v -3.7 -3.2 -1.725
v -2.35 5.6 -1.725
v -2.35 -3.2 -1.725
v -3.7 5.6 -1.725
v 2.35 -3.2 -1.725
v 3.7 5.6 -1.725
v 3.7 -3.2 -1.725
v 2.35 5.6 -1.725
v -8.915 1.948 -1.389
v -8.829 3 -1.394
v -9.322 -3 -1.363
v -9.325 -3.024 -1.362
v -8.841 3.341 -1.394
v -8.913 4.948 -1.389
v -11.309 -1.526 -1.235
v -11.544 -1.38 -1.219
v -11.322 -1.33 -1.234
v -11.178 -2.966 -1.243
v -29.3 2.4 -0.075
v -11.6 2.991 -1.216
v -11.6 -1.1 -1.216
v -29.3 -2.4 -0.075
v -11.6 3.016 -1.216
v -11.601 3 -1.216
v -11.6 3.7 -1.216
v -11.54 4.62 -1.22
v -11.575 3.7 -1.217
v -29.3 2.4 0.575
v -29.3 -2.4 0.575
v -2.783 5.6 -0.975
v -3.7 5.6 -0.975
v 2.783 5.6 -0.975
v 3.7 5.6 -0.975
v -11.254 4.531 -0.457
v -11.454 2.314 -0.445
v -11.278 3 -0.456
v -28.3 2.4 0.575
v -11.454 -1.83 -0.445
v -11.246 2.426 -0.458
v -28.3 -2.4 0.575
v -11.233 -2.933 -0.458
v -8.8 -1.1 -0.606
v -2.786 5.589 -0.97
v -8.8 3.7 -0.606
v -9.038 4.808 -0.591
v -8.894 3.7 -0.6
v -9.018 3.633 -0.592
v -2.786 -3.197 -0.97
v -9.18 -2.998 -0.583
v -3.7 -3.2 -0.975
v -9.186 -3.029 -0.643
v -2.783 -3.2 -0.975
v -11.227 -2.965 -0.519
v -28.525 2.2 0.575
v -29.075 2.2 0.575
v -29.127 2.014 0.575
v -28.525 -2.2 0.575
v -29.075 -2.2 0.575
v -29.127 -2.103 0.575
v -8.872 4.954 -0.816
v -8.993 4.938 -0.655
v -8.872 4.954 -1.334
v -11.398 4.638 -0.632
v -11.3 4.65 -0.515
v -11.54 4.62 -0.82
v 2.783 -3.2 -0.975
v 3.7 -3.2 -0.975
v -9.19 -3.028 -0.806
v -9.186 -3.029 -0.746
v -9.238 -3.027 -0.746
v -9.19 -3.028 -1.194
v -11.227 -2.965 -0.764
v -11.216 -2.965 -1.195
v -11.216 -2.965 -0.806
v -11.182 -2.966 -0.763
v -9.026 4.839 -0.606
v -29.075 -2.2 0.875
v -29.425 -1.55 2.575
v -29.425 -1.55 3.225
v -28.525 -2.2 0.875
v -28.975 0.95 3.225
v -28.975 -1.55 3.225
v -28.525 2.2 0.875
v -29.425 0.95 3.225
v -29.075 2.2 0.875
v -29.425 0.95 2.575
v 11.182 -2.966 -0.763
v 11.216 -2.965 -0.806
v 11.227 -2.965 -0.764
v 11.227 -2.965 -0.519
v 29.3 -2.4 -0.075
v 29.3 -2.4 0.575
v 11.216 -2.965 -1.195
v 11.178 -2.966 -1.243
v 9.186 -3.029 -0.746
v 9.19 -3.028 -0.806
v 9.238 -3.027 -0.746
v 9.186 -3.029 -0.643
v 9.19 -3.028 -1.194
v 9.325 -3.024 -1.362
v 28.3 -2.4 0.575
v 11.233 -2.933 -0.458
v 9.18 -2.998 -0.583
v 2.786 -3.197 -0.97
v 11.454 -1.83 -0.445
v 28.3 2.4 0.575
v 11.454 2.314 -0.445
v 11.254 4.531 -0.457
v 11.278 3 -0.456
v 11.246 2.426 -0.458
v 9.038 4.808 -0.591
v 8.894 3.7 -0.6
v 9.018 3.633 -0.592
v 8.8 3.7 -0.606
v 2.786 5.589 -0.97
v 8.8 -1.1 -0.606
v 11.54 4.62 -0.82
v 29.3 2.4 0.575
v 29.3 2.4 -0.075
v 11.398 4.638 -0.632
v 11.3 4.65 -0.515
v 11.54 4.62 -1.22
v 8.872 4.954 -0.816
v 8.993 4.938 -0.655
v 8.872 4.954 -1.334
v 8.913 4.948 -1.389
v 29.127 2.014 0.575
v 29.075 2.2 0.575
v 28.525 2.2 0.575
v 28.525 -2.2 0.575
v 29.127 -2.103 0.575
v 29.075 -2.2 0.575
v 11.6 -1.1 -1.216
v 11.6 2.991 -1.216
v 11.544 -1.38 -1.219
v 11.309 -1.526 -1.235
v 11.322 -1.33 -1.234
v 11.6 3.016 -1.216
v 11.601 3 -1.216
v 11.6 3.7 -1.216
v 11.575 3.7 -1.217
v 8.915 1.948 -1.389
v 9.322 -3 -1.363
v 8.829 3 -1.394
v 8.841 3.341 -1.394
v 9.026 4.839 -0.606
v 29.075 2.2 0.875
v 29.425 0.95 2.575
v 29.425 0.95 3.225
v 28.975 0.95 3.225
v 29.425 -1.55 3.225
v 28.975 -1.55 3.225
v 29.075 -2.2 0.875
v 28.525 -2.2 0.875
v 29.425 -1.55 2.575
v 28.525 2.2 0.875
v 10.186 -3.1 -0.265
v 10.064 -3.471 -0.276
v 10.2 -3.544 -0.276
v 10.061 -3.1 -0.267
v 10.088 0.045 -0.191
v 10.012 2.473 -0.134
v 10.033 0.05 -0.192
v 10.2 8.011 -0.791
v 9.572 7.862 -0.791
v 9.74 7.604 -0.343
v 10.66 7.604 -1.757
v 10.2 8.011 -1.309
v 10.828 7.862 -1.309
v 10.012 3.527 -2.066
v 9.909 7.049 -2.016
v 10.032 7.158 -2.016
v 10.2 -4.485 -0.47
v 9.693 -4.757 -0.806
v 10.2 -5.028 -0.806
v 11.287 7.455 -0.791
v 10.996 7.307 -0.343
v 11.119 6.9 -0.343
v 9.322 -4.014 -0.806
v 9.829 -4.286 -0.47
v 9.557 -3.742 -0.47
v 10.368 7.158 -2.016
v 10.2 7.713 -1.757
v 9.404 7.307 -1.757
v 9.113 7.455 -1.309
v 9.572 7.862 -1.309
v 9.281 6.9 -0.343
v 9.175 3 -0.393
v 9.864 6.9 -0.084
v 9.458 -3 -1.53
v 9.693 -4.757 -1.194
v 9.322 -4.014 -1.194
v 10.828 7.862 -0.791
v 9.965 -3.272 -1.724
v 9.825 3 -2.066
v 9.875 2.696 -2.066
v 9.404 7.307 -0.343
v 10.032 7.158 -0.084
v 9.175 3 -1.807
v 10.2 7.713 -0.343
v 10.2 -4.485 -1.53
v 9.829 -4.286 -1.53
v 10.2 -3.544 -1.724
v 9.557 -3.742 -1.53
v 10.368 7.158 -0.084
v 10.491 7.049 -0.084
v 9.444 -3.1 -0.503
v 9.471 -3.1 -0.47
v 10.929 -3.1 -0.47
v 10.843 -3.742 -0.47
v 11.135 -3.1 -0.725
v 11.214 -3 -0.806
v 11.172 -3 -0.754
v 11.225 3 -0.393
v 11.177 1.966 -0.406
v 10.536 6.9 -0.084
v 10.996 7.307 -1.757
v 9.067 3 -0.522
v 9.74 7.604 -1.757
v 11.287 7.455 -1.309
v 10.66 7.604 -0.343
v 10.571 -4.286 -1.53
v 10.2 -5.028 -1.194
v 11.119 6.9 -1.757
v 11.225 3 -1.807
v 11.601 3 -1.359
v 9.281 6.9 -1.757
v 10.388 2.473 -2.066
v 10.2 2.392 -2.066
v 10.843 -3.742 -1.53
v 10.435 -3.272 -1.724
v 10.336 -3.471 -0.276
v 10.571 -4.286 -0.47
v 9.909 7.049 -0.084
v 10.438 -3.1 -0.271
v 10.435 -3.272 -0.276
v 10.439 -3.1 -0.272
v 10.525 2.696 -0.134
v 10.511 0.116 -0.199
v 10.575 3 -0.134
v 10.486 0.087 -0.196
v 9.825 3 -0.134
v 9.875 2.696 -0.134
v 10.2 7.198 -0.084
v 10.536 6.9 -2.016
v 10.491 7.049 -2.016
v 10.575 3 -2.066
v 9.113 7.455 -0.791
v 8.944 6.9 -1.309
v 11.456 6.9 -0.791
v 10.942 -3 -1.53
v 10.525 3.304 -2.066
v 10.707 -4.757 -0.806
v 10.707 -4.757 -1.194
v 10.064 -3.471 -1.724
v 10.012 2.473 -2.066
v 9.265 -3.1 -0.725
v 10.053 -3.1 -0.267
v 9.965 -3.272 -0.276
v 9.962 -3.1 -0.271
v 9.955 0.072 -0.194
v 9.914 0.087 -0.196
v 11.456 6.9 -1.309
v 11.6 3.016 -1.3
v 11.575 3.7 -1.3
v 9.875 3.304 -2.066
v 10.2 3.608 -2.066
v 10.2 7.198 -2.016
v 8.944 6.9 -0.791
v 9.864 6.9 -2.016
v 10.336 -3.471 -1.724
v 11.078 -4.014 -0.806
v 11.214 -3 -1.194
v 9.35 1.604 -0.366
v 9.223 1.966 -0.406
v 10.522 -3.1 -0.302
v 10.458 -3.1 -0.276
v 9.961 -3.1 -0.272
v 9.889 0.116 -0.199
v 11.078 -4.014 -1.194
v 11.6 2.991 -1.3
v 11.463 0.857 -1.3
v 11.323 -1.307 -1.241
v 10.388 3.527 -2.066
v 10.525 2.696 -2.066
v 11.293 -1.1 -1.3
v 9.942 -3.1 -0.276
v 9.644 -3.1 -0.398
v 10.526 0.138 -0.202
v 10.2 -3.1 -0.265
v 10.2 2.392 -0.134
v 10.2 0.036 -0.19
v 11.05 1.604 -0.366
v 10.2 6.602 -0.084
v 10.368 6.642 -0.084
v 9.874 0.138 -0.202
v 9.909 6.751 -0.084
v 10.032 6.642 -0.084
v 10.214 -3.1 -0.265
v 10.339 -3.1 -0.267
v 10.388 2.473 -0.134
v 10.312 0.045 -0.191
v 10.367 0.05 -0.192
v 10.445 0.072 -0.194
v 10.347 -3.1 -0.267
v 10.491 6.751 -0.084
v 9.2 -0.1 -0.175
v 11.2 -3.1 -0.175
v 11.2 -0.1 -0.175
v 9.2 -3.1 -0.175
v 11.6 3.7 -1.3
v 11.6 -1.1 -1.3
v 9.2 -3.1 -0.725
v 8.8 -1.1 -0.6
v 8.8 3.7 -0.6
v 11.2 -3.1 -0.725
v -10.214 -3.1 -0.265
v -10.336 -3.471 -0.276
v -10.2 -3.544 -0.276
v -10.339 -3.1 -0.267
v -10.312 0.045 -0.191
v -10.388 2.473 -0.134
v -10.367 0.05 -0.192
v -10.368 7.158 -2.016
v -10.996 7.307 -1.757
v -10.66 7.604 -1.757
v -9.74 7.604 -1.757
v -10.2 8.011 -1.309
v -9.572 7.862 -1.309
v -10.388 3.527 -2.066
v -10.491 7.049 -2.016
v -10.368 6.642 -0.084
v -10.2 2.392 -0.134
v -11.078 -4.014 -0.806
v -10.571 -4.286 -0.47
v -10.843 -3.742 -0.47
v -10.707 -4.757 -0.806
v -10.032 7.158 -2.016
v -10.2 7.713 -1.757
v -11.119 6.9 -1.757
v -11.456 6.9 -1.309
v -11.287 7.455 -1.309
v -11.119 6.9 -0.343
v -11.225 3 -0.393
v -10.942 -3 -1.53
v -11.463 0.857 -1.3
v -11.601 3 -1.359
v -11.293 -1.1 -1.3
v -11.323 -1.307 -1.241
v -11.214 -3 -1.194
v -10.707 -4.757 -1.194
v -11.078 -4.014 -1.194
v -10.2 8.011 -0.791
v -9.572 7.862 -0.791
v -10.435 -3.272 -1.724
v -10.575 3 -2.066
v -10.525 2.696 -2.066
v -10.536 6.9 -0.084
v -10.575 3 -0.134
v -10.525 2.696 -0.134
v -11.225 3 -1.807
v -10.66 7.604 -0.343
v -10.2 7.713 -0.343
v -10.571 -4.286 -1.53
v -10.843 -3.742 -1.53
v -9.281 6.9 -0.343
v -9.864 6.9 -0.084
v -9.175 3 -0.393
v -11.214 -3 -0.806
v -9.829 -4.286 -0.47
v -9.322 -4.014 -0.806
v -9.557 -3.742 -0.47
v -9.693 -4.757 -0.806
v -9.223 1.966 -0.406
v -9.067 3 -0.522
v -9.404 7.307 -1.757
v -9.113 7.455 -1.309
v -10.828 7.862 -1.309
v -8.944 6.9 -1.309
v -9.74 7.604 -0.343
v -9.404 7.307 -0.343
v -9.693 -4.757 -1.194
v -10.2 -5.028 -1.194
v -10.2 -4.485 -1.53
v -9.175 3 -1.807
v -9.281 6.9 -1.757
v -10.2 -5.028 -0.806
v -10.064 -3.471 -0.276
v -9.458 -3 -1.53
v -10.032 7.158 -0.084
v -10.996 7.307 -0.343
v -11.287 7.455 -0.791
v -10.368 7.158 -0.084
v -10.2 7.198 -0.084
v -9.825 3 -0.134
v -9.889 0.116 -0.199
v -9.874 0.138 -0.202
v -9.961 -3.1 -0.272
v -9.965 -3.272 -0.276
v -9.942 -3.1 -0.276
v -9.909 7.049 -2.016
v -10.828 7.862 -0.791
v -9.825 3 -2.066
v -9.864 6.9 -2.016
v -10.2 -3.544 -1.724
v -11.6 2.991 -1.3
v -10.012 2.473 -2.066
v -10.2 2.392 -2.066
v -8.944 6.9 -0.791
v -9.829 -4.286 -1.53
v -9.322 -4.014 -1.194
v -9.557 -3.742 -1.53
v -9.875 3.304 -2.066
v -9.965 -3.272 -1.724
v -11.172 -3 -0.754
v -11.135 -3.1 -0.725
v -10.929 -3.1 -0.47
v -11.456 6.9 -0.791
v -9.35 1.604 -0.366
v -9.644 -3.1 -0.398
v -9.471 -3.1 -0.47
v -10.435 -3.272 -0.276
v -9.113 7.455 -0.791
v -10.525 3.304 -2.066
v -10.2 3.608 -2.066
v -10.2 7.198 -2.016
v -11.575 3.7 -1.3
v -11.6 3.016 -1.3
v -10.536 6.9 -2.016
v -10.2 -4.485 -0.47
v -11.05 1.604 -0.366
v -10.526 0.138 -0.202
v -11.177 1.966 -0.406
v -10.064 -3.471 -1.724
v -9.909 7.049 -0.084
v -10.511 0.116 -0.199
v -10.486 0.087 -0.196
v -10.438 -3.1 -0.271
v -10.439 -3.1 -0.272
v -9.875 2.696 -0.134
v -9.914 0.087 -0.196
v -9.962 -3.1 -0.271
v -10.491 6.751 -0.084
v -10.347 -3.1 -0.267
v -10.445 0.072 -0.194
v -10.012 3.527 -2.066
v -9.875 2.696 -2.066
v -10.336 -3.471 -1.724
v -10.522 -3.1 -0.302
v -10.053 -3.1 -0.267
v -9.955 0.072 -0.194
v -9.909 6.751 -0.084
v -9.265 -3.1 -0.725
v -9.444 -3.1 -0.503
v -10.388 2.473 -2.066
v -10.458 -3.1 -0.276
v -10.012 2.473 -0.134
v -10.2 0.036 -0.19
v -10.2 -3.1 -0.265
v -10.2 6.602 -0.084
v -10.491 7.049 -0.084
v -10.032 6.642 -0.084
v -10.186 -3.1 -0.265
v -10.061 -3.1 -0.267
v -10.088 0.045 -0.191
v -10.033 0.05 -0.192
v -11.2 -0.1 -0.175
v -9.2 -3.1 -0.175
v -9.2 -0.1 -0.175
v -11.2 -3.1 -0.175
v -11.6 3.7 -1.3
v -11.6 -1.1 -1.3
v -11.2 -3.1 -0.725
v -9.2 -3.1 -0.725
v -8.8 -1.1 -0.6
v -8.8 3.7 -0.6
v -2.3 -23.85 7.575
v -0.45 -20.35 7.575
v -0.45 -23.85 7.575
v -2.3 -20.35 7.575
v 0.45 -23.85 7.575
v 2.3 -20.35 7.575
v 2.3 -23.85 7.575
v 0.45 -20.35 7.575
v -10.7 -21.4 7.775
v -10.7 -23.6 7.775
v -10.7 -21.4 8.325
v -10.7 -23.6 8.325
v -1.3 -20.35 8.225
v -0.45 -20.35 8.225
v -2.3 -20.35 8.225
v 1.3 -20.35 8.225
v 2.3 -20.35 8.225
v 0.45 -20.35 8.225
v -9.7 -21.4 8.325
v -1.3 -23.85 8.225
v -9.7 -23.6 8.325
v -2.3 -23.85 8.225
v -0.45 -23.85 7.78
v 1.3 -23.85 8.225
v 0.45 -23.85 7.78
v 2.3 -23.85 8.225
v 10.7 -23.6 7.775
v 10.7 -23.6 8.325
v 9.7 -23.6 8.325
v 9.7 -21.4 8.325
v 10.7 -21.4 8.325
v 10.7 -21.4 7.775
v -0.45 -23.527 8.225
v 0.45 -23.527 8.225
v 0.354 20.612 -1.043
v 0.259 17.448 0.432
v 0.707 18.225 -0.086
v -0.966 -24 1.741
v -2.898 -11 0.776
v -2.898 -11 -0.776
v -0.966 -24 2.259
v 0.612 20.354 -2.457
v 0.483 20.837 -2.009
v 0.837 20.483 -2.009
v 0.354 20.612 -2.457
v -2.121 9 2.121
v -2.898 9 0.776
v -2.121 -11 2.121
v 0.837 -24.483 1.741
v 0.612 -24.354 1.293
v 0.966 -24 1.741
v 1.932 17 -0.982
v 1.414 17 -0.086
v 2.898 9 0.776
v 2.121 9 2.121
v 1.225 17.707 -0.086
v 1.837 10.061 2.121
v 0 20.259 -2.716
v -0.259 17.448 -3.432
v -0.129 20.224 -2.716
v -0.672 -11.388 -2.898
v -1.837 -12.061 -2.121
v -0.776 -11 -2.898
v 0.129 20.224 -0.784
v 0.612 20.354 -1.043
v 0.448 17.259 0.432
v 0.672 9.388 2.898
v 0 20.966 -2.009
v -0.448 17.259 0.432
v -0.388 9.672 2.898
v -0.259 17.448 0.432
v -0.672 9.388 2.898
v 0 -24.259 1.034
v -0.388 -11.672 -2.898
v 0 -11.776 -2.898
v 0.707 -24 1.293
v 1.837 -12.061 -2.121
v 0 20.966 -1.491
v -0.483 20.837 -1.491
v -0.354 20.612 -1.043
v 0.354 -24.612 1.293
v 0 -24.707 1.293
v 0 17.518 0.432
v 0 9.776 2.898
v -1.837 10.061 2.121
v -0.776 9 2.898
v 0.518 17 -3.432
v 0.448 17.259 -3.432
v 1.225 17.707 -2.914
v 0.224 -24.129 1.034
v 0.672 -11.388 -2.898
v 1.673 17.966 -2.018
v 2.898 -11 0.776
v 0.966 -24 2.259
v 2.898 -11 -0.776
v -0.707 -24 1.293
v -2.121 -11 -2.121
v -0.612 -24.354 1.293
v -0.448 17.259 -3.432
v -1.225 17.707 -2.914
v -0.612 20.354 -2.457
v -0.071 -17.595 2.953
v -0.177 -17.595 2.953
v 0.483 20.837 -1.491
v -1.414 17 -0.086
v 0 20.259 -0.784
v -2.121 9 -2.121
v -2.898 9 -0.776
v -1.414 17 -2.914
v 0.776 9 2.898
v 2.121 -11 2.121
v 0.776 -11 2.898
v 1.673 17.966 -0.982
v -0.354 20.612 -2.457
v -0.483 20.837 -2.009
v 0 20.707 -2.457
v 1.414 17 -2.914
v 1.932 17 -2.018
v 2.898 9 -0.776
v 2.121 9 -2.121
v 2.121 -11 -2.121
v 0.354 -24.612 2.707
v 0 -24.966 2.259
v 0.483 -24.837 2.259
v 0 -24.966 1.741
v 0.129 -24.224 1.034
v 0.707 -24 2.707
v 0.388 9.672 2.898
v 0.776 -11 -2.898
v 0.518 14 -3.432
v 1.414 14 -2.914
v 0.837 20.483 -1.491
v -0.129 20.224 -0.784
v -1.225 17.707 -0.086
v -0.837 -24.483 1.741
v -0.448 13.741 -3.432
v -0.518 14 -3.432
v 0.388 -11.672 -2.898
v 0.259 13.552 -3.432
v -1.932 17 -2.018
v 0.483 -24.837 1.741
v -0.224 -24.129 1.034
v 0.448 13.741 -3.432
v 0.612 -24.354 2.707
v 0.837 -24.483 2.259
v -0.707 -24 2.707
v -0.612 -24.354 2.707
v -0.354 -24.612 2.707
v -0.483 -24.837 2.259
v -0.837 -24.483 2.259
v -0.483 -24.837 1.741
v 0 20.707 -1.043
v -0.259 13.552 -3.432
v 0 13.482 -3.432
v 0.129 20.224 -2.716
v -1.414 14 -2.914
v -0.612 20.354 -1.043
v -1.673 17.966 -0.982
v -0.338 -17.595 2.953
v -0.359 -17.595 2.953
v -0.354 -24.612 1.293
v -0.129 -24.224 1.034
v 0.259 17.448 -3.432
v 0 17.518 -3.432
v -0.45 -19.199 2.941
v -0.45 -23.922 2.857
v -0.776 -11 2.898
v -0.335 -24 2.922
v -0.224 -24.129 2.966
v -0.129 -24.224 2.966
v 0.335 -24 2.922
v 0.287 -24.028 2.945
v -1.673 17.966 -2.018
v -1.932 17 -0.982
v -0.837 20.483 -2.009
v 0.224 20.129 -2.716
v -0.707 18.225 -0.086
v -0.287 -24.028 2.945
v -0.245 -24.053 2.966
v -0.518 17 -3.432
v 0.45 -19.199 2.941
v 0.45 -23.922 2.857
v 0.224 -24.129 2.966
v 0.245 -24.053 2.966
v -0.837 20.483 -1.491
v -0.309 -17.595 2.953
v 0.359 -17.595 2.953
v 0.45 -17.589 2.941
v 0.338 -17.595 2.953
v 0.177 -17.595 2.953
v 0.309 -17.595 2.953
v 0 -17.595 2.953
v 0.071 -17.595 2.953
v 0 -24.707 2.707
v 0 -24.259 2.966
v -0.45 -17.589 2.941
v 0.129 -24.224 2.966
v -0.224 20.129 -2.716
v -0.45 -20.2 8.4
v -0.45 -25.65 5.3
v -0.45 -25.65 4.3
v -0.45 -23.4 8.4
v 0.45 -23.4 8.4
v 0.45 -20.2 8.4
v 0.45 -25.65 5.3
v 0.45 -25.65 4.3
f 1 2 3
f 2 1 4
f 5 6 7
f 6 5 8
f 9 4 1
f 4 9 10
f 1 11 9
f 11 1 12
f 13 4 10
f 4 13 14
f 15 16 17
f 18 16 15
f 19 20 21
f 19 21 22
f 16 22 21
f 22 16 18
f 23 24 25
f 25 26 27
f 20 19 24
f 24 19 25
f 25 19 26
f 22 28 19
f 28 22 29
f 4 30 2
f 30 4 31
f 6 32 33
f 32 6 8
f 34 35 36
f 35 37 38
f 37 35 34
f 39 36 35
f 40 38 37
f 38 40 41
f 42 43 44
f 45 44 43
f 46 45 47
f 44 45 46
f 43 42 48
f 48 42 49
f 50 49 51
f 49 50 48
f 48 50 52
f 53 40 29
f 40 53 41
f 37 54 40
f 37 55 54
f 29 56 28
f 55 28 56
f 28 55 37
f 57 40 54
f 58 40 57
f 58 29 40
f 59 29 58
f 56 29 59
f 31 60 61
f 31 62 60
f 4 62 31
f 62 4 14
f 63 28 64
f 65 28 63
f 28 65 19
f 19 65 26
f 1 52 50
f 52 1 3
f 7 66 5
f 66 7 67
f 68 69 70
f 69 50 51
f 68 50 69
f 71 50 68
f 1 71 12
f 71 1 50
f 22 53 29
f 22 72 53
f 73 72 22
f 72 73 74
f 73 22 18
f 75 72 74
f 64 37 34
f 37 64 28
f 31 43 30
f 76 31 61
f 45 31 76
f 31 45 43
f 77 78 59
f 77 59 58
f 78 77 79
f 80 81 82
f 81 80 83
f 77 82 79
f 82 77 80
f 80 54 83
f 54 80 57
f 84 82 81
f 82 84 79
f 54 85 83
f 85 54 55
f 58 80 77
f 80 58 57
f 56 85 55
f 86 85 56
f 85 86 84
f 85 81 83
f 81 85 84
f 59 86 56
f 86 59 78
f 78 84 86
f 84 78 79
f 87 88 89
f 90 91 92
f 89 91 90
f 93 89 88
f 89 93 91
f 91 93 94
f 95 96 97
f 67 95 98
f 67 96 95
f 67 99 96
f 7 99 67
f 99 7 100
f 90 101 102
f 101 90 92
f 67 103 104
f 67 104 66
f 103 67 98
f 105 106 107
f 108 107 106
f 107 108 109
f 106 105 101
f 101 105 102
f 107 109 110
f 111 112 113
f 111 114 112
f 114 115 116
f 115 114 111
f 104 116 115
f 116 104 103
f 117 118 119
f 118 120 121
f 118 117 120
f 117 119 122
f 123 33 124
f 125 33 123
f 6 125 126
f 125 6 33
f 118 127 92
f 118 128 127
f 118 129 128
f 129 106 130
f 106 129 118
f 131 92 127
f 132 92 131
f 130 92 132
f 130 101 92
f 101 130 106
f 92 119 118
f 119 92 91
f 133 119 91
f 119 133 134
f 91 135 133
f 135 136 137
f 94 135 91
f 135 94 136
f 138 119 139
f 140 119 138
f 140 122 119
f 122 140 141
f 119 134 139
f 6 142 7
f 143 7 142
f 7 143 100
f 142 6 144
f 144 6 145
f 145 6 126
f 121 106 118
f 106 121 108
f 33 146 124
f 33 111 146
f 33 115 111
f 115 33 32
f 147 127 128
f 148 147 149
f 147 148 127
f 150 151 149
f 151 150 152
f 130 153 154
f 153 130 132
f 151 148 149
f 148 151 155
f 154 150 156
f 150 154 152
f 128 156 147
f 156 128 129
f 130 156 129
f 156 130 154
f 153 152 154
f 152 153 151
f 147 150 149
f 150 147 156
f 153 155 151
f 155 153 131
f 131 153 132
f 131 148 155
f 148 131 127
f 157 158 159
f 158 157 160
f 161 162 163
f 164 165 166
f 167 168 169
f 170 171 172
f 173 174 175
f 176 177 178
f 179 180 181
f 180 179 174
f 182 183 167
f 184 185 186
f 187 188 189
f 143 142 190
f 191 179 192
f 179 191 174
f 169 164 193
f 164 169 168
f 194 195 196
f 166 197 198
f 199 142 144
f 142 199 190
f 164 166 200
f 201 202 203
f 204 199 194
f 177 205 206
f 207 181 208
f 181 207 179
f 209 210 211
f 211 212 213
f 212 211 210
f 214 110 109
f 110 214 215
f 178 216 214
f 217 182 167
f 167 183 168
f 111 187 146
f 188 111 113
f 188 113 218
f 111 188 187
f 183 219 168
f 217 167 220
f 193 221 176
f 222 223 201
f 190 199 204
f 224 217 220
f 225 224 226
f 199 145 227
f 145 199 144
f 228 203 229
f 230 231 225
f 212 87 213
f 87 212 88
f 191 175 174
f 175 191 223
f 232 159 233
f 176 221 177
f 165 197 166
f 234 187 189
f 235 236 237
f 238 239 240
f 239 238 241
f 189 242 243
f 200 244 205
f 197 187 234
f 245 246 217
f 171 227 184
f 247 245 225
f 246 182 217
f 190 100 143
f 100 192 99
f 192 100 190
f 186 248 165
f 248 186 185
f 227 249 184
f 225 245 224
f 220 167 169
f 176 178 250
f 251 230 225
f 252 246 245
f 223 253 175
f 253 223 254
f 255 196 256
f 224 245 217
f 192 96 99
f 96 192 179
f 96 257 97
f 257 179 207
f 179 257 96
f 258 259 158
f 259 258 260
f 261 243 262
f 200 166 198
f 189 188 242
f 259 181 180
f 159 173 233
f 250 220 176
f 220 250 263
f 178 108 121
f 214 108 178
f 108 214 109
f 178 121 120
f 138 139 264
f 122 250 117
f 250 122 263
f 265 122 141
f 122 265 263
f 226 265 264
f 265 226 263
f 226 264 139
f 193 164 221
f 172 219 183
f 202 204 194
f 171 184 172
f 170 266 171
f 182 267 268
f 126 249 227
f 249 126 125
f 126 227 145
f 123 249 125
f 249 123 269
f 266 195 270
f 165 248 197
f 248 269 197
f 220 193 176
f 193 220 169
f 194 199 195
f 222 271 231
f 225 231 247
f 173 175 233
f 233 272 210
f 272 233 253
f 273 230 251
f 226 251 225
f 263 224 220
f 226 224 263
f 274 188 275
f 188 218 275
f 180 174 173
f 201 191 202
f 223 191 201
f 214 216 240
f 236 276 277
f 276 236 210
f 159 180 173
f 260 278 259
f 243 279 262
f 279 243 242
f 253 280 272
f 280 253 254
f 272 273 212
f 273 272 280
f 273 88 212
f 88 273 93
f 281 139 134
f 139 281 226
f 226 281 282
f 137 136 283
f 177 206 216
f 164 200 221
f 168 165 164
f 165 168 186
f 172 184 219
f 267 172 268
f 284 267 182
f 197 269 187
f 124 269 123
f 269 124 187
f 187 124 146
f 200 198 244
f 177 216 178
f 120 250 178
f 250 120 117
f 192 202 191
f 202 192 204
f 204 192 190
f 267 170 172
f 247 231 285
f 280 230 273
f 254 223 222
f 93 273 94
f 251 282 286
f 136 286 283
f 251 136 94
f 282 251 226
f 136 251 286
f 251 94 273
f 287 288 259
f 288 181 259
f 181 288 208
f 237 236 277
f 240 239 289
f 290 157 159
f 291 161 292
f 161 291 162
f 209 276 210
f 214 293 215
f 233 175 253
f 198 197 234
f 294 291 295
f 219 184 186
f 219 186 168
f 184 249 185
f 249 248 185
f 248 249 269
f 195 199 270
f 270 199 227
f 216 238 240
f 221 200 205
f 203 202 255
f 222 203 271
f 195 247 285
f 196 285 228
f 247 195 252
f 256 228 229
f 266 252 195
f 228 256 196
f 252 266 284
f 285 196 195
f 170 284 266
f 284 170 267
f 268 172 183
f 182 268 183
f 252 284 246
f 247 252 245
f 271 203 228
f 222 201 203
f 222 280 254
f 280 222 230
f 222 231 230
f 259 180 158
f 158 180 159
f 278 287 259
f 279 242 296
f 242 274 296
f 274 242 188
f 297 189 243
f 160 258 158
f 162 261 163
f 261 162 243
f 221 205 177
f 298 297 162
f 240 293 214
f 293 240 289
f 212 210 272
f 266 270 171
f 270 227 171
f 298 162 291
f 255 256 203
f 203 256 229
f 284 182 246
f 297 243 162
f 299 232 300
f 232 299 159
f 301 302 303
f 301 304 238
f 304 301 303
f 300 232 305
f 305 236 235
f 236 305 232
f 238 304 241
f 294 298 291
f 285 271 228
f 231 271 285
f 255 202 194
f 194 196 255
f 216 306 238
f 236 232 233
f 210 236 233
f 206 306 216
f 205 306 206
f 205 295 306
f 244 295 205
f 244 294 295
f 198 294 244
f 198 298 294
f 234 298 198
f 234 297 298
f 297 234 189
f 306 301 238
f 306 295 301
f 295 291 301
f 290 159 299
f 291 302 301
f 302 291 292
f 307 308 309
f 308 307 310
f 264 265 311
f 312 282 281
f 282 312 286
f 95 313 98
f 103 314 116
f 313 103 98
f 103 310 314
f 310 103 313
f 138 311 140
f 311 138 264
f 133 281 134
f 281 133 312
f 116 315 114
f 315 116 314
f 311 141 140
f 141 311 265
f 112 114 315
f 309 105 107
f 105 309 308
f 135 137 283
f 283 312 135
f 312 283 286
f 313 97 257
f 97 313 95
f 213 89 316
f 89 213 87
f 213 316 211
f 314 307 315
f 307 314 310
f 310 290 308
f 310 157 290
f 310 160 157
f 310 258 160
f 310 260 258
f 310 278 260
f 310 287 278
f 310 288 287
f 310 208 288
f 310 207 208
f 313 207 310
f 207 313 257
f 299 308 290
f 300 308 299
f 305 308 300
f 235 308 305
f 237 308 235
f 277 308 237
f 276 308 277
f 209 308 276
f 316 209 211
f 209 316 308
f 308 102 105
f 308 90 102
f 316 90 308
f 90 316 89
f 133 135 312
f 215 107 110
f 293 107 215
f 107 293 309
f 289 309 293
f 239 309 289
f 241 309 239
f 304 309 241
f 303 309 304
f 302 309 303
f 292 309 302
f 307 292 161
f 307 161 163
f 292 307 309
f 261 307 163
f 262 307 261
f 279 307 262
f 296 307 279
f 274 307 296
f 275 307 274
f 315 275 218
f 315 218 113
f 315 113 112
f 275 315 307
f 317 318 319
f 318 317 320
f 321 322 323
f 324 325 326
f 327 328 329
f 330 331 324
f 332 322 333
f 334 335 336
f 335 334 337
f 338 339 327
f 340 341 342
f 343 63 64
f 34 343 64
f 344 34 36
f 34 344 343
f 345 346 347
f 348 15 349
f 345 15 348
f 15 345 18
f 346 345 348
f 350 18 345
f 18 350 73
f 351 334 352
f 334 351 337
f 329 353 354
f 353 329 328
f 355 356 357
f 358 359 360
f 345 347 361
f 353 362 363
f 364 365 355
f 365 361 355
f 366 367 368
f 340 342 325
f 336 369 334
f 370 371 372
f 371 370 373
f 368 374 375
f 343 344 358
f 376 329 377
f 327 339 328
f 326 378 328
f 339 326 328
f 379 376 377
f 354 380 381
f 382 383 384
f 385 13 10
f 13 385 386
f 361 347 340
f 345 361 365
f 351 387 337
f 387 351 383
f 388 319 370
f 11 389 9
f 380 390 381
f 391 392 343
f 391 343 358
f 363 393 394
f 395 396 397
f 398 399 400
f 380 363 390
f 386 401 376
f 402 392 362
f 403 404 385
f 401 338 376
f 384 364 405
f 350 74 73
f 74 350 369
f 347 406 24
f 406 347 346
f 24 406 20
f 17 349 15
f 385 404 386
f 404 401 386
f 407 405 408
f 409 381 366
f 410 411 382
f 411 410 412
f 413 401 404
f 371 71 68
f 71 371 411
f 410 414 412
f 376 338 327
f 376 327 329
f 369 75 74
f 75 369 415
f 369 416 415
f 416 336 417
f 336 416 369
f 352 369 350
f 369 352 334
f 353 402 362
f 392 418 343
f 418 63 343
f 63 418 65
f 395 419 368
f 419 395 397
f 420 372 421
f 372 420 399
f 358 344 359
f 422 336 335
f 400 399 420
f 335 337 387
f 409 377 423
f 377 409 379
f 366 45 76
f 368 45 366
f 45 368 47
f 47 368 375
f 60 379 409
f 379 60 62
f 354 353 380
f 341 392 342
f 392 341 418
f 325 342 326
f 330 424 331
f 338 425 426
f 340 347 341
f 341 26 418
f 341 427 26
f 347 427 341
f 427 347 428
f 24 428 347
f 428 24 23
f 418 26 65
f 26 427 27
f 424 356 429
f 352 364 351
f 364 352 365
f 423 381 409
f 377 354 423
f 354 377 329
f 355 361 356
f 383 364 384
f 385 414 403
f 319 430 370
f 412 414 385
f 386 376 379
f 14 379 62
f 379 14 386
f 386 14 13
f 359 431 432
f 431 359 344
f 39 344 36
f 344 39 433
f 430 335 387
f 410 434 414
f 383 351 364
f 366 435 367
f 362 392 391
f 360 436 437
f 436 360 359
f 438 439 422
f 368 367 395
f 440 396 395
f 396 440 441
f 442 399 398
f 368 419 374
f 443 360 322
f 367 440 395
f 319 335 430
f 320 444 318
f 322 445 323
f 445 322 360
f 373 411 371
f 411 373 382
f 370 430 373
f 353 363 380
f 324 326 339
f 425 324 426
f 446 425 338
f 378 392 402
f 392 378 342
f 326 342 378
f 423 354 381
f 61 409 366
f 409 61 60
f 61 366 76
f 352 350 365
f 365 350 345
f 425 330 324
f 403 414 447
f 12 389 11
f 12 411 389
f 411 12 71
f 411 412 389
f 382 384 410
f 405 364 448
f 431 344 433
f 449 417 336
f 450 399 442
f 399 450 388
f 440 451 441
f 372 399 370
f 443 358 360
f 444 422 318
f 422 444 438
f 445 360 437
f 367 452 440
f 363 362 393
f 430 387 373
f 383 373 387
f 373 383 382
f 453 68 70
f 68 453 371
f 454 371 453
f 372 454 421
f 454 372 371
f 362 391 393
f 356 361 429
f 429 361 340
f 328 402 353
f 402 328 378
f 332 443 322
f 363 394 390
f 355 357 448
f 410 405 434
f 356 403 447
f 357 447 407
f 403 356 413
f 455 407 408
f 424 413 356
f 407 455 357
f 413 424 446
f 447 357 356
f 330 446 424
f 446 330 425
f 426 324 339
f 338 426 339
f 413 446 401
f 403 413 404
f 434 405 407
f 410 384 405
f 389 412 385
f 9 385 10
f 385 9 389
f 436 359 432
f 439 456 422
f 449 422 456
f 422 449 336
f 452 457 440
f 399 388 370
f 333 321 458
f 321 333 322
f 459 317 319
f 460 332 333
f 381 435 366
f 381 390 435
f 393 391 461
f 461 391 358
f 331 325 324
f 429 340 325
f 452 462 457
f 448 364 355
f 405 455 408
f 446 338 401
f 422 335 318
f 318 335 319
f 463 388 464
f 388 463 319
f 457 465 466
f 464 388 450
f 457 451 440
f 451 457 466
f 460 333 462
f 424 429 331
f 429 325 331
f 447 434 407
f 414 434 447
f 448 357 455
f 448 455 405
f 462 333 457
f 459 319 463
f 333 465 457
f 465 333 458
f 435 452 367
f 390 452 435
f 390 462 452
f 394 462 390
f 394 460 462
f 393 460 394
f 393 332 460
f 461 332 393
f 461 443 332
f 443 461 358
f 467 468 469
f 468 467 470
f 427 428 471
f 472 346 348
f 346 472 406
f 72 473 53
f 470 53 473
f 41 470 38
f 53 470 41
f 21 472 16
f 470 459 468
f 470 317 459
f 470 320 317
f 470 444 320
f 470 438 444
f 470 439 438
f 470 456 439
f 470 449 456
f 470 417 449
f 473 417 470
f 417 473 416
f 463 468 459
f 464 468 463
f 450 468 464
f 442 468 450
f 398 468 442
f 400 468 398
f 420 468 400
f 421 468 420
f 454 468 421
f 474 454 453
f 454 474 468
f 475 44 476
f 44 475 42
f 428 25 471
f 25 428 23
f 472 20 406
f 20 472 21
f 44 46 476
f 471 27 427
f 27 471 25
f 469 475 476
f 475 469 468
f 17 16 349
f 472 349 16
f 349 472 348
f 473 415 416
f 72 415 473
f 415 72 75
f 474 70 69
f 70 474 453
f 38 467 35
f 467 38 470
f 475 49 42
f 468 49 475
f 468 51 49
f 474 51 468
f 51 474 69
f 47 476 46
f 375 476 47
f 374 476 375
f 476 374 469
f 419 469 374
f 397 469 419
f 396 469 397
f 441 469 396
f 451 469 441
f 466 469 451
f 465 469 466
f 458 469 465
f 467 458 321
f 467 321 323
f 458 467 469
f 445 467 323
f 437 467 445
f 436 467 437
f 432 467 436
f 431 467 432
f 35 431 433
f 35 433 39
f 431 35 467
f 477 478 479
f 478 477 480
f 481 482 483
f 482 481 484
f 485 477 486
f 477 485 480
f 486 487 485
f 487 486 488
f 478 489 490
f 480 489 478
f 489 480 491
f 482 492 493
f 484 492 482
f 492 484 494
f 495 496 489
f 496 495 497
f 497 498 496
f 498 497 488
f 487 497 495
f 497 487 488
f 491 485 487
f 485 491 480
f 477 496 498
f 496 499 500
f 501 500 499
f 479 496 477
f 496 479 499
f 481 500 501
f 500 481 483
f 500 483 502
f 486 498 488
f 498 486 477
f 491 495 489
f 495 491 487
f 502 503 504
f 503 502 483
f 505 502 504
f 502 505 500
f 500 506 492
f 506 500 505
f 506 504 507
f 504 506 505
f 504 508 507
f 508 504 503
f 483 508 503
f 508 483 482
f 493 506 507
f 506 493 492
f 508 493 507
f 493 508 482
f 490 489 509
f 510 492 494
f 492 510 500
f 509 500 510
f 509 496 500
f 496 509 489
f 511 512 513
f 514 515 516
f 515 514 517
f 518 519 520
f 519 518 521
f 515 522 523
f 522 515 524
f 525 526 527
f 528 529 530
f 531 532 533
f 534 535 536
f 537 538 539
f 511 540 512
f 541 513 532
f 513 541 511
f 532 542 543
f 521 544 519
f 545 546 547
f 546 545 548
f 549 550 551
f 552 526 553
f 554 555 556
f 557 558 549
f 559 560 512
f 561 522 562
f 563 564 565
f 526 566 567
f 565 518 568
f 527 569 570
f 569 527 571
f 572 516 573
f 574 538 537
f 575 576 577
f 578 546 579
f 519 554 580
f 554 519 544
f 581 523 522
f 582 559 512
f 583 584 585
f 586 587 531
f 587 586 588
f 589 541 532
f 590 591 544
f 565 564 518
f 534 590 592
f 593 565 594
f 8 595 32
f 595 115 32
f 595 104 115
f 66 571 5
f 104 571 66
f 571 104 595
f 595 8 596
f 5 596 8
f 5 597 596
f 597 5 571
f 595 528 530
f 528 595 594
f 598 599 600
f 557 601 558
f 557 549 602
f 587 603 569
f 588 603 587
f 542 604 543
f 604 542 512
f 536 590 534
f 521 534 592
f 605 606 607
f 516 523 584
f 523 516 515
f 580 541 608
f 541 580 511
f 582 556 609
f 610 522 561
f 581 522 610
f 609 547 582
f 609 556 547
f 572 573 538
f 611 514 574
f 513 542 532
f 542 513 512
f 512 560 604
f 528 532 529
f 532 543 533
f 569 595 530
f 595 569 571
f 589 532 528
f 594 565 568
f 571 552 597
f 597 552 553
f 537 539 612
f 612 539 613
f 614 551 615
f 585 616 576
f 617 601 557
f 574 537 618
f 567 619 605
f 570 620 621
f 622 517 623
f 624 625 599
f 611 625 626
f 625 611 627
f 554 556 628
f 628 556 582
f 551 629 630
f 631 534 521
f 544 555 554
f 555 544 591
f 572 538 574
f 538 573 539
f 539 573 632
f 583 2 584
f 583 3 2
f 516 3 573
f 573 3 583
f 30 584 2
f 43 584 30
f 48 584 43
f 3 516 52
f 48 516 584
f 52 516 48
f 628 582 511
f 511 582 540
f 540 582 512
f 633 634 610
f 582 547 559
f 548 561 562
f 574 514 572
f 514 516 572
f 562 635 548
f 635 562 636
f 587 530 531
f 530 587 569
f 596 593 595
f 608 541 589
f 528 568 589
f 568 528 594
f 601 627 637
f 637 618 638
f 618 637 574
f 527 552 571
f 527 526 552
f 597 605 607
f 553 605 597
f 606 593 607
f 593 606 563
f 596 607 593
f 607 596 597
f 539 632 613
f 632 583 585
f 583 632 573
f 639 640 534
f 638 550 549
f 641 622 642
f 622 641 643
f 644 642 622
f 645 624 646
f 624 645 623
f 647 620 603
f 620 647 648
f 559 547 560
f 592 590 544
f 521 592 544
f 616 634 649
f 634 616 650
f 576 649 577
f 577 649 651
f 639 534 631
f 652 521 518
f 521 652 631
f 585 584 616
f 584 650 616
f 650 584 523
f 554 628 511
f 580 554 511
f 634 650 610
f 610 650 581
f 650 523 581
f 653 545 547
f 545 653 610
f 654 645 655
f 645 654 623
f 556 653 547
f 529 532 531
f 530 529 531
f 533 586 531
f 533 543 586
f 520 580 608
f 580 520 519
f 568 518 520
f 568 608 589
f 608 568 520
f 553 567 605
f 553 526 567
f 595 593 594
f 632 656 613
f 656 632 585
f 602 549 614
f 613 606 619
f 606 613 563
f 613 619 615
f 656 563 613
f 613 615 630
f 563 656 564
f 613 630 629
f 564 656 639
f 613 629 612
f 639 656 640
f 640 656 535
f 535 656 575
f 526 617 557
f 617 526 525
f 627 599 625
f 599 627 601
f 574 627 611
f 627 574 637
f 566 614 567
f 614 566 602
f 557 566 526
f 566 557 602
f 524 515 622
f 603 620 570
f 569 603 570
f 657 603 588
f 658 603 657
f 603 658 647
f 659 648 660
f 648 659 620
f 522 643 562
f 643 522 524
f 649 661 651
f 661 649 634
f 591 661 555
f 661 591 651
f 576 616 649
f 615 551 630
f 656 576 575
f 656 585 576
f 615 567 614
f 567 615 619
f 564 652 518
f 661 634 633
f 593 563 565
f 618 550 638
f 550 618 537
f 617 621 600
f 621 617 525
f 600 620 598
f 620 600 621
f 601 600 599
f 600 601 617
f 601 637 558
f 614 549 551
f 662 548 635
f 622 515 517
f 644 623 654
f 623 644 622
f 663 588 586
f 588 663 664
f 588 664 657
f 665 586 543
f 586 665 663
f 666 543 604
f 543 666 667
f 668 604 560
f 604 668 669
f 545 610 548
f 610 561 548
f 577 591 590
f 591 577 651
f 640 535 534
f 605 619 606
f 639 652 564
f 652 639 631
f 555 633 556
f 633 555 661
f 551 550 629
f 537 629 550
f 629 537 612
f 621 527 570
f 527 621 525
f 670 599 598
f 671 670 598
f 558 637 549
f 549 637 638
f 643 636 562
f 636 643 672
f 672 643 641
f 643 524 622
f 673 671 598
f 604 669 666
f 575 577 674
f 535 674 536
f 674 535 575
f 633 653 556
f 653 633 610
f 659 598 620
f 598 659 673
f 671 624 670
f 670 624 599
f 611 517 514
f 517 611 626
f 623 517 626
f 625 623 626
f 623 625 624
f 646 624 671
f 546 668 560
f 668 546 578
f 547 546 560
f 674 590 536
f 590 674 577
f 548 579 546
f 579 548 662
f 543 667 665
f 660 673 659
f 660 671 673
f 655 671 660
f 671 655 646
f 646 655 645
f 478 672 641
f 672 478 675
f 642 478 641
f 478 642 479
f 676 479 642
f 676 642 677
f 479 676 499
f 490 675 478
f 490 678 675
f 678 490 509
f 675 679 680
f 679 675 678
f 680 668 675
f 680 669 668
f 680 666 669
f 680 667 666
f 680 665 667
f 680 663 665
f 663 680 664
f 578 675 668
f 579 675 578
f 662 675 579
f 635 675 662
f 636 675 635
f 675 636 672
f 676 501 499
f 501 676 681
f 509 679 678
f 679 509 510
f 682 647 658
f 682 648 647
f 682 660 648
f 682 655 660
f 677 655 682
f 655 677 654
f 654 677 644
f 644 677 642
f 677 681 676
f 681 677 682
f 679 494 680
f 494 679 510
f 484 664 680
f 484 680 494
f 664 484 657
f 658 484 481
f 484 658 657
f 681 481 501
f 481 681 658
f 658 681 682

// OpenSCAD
$fn = 12;

// Coordinate convention:
// +Y = nose
// -Y = tail
// X  = wingspan
// Z  = up

show_props    = false;  // visual only; leave false for RF meshing
show_winglets = true;   // set false for simpler RF mesh

module ellipsoid(p=[0,0,0], s=[1,1,1]) {
    translate(p)
        scale(s)
            sphere(r=1);
}

module fuselage() {
    // Smooth King Air-style pressurized fuselage:
    // not a bubble canopy, just a tube with a sloped nose/cockpit crown.
    hull() {
        translate([0,20,-1.75]) sphere(r=1);
        translate([0,17,-1.5]) sphere(r=2);
        translate([0,14,-1.5]) sphere(r=2);
        translate([0,9,0]) sphere(r=3);
        sphere(r=3);
        translate([0,-11,0]) sphere(r=3);
        translate([0,-24,2]) sphere(r=1);
    }
}

module sloped_cabin_roof() {
    // Subtle continuous roof crown.
    // This replaces the old "cockpit bubble."
    hull() {
        ellipsoid([0, 20.8, 0.95], [0.75, 0.9, 0.18]);  // low forward nose crown
        ellipsoid([0, 16.5, 1.45], [1.10, 1.8, 0.22]);  // windshield slope region
        ellipsoid([0,  6.0, 1.95], [1.55, 6.5, 0.24]);  // long cabin roof
        ellipsoid([0, -9.0, 1.75], [1.35, 4.5, 0.18]);  // taper aft
    }
}

module main_wing() {
    // Low wing, modest dihedral, mildly tapered.
    translate([0, 1.2, -1.35])
        cube([7.0, 8.8, 0.75], center=true);

    for (s = [-1, 1]) {
        hull() {
            translate([s*3.2, 1.2, -1.35])
                cube([1.0, 8.8, 0.75], center=true);   // root chord

            translate([s*28.8, 0.0, 0.25])
                cube([1.0, 4.8, 0.65], center=true);   // tip chord, raised
        }

        if (show_winglets) {
            hull() {
                translate([s*28.8, 0.0, 0.55])
                    cube([0.55, 4.4, 0.65], center=true);

                translate([s*29.2, -0.3, 2.9])
                    cube([0.45, 2.5, 0.65], center=true);
            }
        }
    }
}

module engine_nacelle(x) {
    // Smaller turboprop nacelle blended into the wing.
    // Front is just ahead of the wing leading edge; aft fairing trails back.
    hull() {
        ellipsoid([x,  6.9, -1.05], [1.30, 1.15, 1.00]); // cowling/front
        ellipsoid([x,  3.0, -1.10], [1.45, 2.35, 1.00]); // main nacelle
        ellipsoid([x, -3.0, -1.00], [1.05, 2.10, 0.75]); // aft fairing
    }

    // Upper fairing into the wing
    hull() {
        translate([x, 1.3, -0.95])
            cube([2.8, 4.8, 0.7], center=true);

        translate([x, -1.6, -0.45])
            cube([2.0, 3.0, 0.55], center=true);
    }

    // Crude prop disk, disabled by default
    if (show_props) {
        translate([x, 8.45, -1.05])
            rotate([90, 0, 0])
                cylinder(h=0.35, r=2.75, center=true);
    }
}

module engines() {
    engine_nacelle( 10.2);
    engine_nacelle(-10.2);
}

module vertical_tail() {
    // Swept vertical fin for the T-tail.
    hull() {
        translate([0, -19.0, 1.0])
            cube([0.9, 4.2, 1.0], center=true);

        translate([0, -21.8, 7.9])
            cube([0.9, 3.2, 1.0], center=true);

        translate([0, -24.5, 4.8])
            cube([0.9, 2.3, 1.0], center=true);
    }
}

module horizontal_tail() {
    // High-mounted T-tail, narrower than main wing.
    translate([0, -22.1, 7.9])
        cube([3.8, 3.5, 0.65], center=true);

    for (s = [-1, 1]) {
        hull() {
            translate([s*1.8, -22.1, 7.9])
                cube([1.0, 3.5, 0.65], center=true);

            translate([s*10.2, -22.5, 8.05])
                cube([1.0, 2.2, 0.55], center=true);
        }
    }
}

union() {
    fuselage();
//    sloped_cabin_roof();

    main_wing();
    engines();

    vertical_tail();
    horizontal_tail();
}
